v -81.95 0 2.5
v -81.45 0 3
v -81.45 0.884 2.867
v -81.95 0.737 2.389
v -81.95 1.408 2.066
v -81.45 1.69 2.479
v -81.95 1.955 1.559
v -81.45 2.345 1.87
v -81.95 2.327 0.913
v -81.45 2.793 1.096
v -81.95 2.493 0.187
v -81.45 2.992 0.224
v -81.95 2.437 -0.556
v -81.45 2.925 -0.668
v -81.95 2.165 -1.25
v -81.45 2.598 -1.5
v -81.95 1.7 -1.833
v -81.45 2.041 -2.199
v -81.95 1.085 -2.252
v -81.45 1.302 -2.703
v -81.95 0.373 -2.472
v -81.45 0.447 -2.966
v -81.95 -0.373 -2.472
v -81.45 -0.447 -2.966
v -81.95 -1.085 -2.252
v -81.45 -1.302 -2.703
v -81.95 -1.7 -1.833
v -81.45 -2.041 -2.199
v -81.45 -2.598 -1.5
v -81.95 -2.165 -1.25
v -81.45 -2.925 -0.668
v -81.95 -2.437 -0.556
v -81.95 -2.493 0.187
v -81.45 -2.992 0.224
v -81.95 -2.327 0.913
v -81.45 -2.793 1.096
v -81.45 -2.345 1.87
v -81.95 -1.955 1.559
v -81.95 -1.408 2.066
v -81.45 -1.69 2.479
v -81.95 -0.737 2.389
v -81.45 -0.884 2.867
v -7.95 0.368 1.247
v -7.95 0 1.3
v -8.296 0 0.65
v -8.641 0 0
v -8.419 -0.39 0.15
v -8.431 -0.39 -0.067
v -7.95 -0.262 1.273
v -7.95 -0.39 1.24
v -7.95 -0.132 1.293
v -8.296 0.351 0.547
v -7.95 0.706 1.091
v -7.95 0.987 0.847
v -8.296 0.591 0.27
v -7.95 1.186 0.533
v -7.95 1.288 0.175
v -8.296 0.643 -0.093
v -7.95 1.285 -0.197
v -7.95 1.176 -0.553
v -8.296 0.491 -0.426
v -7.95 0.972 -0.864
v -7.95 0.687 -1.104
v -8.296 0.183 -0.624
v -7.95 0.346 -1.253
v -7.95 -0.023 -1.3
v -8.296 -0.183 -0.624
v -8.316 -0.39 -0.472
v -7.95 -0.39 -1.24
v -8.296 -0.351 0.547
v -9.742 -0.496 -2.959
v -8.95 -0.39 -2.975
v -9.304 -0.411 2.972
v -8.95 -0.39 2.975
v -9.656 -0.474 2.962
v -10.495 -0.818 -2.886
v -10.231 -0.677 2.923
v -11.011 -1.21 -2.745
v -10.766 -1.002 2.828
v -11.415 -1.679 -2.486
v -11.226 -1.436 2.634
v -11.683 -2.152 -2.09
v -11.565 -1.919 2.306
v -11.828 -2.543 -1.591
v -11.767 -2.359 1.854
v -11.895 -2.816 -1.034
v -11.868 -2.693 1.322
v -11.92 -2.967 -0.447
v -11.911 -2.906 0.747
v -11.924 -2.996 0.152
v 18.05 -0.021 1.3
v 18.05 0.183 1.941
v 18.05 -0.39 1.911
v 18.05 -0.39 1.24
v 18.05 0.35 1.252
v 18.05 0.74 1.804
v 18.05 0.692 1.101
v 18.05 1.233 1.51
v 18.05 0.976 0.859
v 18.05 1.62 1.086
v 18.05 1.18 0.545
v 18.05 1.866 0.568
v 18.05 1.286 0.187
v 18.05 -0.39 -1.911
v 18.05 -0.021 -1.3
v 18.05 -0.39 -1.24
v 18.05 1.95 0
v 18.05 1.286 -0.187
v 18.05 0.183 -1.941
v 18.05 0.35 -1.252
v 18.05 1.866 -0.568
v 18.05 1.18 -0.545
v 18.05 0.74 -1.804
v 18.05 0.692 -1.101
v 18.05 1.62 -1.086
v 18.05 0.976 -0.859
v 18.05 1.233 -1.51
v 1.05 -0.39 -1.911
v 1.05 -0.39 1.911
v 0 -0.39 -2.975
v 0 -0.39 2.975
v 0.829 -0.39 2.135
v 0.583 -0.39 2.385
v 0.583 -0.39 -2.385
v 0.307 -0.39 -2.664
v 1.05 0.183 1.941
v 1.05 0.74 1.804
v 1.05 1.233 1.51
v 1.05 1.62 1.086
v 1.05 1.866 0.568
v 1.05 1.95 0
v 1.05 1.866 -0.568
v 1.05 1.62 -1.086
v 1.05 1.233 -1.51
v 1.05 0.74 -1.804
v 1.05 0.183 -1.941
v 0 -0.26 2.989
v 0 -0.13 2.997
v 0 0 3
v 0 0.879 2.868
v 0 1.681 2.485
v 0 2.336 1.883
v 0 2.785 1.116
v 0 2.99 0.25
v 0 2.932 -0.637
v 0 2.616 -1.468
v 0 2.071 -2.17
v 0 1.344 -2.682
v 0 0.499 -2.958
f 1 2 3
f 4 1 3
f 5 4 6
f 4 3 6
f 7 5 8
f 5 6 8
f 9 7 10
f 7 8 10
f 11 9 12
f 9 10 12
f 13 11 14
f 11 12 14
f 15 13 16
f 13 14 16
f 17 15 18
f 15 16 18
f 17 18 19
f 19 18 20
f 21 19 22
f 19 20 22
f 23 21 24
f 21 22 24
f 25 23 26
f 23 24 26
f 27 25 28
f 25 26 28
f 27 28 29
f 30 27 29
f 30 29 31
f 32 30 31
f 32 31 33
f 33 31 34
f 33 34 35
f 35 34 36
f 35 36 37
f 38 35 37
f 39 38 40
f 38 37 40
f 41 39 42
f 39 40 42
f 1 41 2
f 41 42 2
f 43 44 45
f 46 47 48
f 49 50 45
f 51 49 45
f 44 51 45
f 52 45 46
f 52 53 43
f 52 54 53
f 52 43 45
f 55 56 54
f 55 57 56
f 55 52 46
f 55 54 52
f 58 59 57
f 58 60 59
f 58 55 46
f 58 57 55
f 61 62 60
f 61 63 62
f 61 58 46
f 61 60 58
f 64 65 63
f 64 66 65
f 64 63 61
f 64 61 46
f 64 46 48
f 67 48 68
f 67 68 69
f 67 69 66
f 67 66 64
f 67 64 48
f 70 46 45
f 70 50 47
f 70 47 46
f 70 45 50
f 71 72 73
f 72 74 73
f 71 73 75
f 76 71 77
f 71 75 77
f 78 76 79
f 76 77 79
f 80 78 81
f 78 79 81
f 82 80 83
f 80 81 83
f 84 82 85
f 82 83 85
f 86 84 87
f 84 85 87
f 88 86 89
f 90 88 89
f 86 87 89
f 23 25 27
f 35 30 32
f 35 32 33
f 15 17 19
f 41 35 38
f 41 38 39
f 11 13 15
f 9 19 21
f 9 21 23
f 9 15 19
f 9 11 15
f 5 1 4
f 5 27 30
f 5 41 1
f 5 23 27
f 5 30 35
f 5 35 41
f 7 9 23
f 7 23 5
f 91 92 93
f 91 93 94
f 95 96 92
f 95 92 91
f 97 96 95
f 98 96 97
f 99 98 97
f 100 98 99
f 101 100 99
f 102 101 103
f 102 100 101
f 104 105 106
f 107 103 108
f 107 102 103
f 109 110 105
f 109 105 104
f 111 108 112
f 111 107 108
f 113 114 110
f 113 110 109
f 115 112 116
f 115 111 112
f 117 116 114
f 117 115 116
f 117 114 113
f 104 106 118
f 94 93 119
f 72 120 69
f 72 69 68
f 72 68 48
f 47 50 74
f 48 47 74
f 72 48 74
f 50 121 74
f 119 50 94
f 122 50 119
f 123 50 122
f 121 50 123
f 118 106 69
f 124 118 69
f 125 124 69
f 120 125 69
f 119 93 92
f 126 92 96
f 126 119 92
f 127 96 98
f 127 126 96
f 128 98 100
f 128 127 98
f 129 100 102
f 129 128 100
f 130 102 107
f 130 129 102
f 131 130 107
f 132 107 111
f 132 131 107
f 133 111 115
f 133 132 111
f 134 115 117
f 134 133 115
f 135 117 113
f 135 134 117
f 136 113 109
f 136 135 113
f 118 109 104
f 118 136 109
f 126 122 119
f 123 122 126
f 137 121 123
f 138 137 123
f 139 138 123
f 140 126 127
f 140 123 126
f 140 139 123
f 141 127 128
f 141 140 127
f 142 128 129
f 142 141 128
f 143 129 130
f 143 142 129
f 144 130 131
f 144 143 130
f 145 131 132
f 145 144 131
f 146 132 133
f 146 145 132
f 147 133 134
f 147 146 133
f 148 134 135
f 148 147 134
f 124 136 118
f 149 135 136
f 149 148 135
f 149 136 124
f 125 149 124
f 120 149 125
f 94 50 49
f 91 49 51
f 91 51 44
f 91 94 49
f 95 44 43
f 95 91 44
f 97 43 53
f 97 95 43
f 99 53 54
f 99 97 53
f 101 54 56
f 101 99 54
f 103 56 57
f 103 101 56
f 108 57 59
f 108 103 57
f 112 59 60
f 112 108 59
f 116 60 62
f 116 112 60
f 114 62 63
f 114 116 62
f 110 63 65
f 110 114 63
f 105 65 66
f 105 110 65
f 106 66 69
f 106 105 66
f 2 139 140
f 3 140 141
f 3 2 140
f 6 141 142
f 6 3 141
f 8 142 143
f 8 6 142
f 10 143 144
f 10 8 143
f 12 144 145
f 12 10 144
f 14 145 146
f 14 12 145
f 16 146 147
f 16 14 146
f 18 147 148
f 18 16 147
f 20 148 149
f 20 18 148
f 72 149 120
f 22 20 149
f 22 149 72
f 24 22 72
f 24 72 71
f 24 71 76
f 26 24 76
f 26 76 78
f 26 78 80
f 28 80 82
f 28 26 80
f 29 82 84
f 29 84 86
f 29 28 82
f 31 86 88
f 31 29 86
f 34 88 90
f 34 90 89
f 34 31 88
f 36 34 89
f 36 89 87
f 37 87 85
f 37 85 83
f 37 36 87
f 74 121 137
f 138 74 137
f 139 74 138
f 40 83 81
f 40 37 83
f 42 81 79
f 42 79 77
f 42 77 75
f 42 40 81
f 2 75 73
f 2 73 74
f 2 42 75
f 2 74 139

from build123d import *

# Parameters (mm, degrees)
F4_DEPTH = 25
F5_SIZE  = 0.5


with BuildPart() as f1:
    # F0 (on Front) → F1 (revolve)
    with BuildSketch(Plane.XZ):
        Polygon((-81.95, 3), (-81.95, 0), (-8.641222, 0), (-7.95, 1.3), (18.05, 1.3), (18.05, 1.95), (1.05, 1.95), (0, 3), align=None)
    revolve(axis=Axis((-31.95, 0, 0), (-1, 0, 0)))

    # F3 (on offset) → F4 (cut)
    with BuildSketch(Plane.XY.offset(3)):
        with BuildLine():
            ThreePointArc((-8.95, -0.39), (-11.07132, -5.51132), (-5.95, -3.39))
            Line((-5.95, -3.39), (-8.95, -3.39))
            Line((-8.95, -3.39), (-8.95, -0.39))
        make_face()
        with BuildLine():
            ThreePointArc((-8.95, -0.39), (-6.82868, -1.26868), (-5.95, -3.39))
            Line((-5.95, -3.39), (18.05, -3.39))
            Line((18.05, -3.39), (18.05, -1.95))
            Line((18.05, -1.95), (18.05, -0.39))
            Line((18.05, -0.39), (-8.95, -0.39))
        make_face()
        with BuildLine():
            Line((-8.95, -3.39), (-5.95, -3.39))
            ThreePointArc((-5.95, -3.39), (-6.82868, -1.26868), (-8.95, -0.39))
            Line((-8.95, -0.39), (-8.95, -3.39))
        make_face()
    extrude(amount=-F4_DEPTH, mode=Mode.SUBTRACT)

    # F5
    f5_edges = [f1.edges().sort_by_distance(p)[0] for p in [
        (-81.95, 0, -3),
    ]]
    chamfer(f5_edges, length=F5_SIZE)


solid = f1.part
